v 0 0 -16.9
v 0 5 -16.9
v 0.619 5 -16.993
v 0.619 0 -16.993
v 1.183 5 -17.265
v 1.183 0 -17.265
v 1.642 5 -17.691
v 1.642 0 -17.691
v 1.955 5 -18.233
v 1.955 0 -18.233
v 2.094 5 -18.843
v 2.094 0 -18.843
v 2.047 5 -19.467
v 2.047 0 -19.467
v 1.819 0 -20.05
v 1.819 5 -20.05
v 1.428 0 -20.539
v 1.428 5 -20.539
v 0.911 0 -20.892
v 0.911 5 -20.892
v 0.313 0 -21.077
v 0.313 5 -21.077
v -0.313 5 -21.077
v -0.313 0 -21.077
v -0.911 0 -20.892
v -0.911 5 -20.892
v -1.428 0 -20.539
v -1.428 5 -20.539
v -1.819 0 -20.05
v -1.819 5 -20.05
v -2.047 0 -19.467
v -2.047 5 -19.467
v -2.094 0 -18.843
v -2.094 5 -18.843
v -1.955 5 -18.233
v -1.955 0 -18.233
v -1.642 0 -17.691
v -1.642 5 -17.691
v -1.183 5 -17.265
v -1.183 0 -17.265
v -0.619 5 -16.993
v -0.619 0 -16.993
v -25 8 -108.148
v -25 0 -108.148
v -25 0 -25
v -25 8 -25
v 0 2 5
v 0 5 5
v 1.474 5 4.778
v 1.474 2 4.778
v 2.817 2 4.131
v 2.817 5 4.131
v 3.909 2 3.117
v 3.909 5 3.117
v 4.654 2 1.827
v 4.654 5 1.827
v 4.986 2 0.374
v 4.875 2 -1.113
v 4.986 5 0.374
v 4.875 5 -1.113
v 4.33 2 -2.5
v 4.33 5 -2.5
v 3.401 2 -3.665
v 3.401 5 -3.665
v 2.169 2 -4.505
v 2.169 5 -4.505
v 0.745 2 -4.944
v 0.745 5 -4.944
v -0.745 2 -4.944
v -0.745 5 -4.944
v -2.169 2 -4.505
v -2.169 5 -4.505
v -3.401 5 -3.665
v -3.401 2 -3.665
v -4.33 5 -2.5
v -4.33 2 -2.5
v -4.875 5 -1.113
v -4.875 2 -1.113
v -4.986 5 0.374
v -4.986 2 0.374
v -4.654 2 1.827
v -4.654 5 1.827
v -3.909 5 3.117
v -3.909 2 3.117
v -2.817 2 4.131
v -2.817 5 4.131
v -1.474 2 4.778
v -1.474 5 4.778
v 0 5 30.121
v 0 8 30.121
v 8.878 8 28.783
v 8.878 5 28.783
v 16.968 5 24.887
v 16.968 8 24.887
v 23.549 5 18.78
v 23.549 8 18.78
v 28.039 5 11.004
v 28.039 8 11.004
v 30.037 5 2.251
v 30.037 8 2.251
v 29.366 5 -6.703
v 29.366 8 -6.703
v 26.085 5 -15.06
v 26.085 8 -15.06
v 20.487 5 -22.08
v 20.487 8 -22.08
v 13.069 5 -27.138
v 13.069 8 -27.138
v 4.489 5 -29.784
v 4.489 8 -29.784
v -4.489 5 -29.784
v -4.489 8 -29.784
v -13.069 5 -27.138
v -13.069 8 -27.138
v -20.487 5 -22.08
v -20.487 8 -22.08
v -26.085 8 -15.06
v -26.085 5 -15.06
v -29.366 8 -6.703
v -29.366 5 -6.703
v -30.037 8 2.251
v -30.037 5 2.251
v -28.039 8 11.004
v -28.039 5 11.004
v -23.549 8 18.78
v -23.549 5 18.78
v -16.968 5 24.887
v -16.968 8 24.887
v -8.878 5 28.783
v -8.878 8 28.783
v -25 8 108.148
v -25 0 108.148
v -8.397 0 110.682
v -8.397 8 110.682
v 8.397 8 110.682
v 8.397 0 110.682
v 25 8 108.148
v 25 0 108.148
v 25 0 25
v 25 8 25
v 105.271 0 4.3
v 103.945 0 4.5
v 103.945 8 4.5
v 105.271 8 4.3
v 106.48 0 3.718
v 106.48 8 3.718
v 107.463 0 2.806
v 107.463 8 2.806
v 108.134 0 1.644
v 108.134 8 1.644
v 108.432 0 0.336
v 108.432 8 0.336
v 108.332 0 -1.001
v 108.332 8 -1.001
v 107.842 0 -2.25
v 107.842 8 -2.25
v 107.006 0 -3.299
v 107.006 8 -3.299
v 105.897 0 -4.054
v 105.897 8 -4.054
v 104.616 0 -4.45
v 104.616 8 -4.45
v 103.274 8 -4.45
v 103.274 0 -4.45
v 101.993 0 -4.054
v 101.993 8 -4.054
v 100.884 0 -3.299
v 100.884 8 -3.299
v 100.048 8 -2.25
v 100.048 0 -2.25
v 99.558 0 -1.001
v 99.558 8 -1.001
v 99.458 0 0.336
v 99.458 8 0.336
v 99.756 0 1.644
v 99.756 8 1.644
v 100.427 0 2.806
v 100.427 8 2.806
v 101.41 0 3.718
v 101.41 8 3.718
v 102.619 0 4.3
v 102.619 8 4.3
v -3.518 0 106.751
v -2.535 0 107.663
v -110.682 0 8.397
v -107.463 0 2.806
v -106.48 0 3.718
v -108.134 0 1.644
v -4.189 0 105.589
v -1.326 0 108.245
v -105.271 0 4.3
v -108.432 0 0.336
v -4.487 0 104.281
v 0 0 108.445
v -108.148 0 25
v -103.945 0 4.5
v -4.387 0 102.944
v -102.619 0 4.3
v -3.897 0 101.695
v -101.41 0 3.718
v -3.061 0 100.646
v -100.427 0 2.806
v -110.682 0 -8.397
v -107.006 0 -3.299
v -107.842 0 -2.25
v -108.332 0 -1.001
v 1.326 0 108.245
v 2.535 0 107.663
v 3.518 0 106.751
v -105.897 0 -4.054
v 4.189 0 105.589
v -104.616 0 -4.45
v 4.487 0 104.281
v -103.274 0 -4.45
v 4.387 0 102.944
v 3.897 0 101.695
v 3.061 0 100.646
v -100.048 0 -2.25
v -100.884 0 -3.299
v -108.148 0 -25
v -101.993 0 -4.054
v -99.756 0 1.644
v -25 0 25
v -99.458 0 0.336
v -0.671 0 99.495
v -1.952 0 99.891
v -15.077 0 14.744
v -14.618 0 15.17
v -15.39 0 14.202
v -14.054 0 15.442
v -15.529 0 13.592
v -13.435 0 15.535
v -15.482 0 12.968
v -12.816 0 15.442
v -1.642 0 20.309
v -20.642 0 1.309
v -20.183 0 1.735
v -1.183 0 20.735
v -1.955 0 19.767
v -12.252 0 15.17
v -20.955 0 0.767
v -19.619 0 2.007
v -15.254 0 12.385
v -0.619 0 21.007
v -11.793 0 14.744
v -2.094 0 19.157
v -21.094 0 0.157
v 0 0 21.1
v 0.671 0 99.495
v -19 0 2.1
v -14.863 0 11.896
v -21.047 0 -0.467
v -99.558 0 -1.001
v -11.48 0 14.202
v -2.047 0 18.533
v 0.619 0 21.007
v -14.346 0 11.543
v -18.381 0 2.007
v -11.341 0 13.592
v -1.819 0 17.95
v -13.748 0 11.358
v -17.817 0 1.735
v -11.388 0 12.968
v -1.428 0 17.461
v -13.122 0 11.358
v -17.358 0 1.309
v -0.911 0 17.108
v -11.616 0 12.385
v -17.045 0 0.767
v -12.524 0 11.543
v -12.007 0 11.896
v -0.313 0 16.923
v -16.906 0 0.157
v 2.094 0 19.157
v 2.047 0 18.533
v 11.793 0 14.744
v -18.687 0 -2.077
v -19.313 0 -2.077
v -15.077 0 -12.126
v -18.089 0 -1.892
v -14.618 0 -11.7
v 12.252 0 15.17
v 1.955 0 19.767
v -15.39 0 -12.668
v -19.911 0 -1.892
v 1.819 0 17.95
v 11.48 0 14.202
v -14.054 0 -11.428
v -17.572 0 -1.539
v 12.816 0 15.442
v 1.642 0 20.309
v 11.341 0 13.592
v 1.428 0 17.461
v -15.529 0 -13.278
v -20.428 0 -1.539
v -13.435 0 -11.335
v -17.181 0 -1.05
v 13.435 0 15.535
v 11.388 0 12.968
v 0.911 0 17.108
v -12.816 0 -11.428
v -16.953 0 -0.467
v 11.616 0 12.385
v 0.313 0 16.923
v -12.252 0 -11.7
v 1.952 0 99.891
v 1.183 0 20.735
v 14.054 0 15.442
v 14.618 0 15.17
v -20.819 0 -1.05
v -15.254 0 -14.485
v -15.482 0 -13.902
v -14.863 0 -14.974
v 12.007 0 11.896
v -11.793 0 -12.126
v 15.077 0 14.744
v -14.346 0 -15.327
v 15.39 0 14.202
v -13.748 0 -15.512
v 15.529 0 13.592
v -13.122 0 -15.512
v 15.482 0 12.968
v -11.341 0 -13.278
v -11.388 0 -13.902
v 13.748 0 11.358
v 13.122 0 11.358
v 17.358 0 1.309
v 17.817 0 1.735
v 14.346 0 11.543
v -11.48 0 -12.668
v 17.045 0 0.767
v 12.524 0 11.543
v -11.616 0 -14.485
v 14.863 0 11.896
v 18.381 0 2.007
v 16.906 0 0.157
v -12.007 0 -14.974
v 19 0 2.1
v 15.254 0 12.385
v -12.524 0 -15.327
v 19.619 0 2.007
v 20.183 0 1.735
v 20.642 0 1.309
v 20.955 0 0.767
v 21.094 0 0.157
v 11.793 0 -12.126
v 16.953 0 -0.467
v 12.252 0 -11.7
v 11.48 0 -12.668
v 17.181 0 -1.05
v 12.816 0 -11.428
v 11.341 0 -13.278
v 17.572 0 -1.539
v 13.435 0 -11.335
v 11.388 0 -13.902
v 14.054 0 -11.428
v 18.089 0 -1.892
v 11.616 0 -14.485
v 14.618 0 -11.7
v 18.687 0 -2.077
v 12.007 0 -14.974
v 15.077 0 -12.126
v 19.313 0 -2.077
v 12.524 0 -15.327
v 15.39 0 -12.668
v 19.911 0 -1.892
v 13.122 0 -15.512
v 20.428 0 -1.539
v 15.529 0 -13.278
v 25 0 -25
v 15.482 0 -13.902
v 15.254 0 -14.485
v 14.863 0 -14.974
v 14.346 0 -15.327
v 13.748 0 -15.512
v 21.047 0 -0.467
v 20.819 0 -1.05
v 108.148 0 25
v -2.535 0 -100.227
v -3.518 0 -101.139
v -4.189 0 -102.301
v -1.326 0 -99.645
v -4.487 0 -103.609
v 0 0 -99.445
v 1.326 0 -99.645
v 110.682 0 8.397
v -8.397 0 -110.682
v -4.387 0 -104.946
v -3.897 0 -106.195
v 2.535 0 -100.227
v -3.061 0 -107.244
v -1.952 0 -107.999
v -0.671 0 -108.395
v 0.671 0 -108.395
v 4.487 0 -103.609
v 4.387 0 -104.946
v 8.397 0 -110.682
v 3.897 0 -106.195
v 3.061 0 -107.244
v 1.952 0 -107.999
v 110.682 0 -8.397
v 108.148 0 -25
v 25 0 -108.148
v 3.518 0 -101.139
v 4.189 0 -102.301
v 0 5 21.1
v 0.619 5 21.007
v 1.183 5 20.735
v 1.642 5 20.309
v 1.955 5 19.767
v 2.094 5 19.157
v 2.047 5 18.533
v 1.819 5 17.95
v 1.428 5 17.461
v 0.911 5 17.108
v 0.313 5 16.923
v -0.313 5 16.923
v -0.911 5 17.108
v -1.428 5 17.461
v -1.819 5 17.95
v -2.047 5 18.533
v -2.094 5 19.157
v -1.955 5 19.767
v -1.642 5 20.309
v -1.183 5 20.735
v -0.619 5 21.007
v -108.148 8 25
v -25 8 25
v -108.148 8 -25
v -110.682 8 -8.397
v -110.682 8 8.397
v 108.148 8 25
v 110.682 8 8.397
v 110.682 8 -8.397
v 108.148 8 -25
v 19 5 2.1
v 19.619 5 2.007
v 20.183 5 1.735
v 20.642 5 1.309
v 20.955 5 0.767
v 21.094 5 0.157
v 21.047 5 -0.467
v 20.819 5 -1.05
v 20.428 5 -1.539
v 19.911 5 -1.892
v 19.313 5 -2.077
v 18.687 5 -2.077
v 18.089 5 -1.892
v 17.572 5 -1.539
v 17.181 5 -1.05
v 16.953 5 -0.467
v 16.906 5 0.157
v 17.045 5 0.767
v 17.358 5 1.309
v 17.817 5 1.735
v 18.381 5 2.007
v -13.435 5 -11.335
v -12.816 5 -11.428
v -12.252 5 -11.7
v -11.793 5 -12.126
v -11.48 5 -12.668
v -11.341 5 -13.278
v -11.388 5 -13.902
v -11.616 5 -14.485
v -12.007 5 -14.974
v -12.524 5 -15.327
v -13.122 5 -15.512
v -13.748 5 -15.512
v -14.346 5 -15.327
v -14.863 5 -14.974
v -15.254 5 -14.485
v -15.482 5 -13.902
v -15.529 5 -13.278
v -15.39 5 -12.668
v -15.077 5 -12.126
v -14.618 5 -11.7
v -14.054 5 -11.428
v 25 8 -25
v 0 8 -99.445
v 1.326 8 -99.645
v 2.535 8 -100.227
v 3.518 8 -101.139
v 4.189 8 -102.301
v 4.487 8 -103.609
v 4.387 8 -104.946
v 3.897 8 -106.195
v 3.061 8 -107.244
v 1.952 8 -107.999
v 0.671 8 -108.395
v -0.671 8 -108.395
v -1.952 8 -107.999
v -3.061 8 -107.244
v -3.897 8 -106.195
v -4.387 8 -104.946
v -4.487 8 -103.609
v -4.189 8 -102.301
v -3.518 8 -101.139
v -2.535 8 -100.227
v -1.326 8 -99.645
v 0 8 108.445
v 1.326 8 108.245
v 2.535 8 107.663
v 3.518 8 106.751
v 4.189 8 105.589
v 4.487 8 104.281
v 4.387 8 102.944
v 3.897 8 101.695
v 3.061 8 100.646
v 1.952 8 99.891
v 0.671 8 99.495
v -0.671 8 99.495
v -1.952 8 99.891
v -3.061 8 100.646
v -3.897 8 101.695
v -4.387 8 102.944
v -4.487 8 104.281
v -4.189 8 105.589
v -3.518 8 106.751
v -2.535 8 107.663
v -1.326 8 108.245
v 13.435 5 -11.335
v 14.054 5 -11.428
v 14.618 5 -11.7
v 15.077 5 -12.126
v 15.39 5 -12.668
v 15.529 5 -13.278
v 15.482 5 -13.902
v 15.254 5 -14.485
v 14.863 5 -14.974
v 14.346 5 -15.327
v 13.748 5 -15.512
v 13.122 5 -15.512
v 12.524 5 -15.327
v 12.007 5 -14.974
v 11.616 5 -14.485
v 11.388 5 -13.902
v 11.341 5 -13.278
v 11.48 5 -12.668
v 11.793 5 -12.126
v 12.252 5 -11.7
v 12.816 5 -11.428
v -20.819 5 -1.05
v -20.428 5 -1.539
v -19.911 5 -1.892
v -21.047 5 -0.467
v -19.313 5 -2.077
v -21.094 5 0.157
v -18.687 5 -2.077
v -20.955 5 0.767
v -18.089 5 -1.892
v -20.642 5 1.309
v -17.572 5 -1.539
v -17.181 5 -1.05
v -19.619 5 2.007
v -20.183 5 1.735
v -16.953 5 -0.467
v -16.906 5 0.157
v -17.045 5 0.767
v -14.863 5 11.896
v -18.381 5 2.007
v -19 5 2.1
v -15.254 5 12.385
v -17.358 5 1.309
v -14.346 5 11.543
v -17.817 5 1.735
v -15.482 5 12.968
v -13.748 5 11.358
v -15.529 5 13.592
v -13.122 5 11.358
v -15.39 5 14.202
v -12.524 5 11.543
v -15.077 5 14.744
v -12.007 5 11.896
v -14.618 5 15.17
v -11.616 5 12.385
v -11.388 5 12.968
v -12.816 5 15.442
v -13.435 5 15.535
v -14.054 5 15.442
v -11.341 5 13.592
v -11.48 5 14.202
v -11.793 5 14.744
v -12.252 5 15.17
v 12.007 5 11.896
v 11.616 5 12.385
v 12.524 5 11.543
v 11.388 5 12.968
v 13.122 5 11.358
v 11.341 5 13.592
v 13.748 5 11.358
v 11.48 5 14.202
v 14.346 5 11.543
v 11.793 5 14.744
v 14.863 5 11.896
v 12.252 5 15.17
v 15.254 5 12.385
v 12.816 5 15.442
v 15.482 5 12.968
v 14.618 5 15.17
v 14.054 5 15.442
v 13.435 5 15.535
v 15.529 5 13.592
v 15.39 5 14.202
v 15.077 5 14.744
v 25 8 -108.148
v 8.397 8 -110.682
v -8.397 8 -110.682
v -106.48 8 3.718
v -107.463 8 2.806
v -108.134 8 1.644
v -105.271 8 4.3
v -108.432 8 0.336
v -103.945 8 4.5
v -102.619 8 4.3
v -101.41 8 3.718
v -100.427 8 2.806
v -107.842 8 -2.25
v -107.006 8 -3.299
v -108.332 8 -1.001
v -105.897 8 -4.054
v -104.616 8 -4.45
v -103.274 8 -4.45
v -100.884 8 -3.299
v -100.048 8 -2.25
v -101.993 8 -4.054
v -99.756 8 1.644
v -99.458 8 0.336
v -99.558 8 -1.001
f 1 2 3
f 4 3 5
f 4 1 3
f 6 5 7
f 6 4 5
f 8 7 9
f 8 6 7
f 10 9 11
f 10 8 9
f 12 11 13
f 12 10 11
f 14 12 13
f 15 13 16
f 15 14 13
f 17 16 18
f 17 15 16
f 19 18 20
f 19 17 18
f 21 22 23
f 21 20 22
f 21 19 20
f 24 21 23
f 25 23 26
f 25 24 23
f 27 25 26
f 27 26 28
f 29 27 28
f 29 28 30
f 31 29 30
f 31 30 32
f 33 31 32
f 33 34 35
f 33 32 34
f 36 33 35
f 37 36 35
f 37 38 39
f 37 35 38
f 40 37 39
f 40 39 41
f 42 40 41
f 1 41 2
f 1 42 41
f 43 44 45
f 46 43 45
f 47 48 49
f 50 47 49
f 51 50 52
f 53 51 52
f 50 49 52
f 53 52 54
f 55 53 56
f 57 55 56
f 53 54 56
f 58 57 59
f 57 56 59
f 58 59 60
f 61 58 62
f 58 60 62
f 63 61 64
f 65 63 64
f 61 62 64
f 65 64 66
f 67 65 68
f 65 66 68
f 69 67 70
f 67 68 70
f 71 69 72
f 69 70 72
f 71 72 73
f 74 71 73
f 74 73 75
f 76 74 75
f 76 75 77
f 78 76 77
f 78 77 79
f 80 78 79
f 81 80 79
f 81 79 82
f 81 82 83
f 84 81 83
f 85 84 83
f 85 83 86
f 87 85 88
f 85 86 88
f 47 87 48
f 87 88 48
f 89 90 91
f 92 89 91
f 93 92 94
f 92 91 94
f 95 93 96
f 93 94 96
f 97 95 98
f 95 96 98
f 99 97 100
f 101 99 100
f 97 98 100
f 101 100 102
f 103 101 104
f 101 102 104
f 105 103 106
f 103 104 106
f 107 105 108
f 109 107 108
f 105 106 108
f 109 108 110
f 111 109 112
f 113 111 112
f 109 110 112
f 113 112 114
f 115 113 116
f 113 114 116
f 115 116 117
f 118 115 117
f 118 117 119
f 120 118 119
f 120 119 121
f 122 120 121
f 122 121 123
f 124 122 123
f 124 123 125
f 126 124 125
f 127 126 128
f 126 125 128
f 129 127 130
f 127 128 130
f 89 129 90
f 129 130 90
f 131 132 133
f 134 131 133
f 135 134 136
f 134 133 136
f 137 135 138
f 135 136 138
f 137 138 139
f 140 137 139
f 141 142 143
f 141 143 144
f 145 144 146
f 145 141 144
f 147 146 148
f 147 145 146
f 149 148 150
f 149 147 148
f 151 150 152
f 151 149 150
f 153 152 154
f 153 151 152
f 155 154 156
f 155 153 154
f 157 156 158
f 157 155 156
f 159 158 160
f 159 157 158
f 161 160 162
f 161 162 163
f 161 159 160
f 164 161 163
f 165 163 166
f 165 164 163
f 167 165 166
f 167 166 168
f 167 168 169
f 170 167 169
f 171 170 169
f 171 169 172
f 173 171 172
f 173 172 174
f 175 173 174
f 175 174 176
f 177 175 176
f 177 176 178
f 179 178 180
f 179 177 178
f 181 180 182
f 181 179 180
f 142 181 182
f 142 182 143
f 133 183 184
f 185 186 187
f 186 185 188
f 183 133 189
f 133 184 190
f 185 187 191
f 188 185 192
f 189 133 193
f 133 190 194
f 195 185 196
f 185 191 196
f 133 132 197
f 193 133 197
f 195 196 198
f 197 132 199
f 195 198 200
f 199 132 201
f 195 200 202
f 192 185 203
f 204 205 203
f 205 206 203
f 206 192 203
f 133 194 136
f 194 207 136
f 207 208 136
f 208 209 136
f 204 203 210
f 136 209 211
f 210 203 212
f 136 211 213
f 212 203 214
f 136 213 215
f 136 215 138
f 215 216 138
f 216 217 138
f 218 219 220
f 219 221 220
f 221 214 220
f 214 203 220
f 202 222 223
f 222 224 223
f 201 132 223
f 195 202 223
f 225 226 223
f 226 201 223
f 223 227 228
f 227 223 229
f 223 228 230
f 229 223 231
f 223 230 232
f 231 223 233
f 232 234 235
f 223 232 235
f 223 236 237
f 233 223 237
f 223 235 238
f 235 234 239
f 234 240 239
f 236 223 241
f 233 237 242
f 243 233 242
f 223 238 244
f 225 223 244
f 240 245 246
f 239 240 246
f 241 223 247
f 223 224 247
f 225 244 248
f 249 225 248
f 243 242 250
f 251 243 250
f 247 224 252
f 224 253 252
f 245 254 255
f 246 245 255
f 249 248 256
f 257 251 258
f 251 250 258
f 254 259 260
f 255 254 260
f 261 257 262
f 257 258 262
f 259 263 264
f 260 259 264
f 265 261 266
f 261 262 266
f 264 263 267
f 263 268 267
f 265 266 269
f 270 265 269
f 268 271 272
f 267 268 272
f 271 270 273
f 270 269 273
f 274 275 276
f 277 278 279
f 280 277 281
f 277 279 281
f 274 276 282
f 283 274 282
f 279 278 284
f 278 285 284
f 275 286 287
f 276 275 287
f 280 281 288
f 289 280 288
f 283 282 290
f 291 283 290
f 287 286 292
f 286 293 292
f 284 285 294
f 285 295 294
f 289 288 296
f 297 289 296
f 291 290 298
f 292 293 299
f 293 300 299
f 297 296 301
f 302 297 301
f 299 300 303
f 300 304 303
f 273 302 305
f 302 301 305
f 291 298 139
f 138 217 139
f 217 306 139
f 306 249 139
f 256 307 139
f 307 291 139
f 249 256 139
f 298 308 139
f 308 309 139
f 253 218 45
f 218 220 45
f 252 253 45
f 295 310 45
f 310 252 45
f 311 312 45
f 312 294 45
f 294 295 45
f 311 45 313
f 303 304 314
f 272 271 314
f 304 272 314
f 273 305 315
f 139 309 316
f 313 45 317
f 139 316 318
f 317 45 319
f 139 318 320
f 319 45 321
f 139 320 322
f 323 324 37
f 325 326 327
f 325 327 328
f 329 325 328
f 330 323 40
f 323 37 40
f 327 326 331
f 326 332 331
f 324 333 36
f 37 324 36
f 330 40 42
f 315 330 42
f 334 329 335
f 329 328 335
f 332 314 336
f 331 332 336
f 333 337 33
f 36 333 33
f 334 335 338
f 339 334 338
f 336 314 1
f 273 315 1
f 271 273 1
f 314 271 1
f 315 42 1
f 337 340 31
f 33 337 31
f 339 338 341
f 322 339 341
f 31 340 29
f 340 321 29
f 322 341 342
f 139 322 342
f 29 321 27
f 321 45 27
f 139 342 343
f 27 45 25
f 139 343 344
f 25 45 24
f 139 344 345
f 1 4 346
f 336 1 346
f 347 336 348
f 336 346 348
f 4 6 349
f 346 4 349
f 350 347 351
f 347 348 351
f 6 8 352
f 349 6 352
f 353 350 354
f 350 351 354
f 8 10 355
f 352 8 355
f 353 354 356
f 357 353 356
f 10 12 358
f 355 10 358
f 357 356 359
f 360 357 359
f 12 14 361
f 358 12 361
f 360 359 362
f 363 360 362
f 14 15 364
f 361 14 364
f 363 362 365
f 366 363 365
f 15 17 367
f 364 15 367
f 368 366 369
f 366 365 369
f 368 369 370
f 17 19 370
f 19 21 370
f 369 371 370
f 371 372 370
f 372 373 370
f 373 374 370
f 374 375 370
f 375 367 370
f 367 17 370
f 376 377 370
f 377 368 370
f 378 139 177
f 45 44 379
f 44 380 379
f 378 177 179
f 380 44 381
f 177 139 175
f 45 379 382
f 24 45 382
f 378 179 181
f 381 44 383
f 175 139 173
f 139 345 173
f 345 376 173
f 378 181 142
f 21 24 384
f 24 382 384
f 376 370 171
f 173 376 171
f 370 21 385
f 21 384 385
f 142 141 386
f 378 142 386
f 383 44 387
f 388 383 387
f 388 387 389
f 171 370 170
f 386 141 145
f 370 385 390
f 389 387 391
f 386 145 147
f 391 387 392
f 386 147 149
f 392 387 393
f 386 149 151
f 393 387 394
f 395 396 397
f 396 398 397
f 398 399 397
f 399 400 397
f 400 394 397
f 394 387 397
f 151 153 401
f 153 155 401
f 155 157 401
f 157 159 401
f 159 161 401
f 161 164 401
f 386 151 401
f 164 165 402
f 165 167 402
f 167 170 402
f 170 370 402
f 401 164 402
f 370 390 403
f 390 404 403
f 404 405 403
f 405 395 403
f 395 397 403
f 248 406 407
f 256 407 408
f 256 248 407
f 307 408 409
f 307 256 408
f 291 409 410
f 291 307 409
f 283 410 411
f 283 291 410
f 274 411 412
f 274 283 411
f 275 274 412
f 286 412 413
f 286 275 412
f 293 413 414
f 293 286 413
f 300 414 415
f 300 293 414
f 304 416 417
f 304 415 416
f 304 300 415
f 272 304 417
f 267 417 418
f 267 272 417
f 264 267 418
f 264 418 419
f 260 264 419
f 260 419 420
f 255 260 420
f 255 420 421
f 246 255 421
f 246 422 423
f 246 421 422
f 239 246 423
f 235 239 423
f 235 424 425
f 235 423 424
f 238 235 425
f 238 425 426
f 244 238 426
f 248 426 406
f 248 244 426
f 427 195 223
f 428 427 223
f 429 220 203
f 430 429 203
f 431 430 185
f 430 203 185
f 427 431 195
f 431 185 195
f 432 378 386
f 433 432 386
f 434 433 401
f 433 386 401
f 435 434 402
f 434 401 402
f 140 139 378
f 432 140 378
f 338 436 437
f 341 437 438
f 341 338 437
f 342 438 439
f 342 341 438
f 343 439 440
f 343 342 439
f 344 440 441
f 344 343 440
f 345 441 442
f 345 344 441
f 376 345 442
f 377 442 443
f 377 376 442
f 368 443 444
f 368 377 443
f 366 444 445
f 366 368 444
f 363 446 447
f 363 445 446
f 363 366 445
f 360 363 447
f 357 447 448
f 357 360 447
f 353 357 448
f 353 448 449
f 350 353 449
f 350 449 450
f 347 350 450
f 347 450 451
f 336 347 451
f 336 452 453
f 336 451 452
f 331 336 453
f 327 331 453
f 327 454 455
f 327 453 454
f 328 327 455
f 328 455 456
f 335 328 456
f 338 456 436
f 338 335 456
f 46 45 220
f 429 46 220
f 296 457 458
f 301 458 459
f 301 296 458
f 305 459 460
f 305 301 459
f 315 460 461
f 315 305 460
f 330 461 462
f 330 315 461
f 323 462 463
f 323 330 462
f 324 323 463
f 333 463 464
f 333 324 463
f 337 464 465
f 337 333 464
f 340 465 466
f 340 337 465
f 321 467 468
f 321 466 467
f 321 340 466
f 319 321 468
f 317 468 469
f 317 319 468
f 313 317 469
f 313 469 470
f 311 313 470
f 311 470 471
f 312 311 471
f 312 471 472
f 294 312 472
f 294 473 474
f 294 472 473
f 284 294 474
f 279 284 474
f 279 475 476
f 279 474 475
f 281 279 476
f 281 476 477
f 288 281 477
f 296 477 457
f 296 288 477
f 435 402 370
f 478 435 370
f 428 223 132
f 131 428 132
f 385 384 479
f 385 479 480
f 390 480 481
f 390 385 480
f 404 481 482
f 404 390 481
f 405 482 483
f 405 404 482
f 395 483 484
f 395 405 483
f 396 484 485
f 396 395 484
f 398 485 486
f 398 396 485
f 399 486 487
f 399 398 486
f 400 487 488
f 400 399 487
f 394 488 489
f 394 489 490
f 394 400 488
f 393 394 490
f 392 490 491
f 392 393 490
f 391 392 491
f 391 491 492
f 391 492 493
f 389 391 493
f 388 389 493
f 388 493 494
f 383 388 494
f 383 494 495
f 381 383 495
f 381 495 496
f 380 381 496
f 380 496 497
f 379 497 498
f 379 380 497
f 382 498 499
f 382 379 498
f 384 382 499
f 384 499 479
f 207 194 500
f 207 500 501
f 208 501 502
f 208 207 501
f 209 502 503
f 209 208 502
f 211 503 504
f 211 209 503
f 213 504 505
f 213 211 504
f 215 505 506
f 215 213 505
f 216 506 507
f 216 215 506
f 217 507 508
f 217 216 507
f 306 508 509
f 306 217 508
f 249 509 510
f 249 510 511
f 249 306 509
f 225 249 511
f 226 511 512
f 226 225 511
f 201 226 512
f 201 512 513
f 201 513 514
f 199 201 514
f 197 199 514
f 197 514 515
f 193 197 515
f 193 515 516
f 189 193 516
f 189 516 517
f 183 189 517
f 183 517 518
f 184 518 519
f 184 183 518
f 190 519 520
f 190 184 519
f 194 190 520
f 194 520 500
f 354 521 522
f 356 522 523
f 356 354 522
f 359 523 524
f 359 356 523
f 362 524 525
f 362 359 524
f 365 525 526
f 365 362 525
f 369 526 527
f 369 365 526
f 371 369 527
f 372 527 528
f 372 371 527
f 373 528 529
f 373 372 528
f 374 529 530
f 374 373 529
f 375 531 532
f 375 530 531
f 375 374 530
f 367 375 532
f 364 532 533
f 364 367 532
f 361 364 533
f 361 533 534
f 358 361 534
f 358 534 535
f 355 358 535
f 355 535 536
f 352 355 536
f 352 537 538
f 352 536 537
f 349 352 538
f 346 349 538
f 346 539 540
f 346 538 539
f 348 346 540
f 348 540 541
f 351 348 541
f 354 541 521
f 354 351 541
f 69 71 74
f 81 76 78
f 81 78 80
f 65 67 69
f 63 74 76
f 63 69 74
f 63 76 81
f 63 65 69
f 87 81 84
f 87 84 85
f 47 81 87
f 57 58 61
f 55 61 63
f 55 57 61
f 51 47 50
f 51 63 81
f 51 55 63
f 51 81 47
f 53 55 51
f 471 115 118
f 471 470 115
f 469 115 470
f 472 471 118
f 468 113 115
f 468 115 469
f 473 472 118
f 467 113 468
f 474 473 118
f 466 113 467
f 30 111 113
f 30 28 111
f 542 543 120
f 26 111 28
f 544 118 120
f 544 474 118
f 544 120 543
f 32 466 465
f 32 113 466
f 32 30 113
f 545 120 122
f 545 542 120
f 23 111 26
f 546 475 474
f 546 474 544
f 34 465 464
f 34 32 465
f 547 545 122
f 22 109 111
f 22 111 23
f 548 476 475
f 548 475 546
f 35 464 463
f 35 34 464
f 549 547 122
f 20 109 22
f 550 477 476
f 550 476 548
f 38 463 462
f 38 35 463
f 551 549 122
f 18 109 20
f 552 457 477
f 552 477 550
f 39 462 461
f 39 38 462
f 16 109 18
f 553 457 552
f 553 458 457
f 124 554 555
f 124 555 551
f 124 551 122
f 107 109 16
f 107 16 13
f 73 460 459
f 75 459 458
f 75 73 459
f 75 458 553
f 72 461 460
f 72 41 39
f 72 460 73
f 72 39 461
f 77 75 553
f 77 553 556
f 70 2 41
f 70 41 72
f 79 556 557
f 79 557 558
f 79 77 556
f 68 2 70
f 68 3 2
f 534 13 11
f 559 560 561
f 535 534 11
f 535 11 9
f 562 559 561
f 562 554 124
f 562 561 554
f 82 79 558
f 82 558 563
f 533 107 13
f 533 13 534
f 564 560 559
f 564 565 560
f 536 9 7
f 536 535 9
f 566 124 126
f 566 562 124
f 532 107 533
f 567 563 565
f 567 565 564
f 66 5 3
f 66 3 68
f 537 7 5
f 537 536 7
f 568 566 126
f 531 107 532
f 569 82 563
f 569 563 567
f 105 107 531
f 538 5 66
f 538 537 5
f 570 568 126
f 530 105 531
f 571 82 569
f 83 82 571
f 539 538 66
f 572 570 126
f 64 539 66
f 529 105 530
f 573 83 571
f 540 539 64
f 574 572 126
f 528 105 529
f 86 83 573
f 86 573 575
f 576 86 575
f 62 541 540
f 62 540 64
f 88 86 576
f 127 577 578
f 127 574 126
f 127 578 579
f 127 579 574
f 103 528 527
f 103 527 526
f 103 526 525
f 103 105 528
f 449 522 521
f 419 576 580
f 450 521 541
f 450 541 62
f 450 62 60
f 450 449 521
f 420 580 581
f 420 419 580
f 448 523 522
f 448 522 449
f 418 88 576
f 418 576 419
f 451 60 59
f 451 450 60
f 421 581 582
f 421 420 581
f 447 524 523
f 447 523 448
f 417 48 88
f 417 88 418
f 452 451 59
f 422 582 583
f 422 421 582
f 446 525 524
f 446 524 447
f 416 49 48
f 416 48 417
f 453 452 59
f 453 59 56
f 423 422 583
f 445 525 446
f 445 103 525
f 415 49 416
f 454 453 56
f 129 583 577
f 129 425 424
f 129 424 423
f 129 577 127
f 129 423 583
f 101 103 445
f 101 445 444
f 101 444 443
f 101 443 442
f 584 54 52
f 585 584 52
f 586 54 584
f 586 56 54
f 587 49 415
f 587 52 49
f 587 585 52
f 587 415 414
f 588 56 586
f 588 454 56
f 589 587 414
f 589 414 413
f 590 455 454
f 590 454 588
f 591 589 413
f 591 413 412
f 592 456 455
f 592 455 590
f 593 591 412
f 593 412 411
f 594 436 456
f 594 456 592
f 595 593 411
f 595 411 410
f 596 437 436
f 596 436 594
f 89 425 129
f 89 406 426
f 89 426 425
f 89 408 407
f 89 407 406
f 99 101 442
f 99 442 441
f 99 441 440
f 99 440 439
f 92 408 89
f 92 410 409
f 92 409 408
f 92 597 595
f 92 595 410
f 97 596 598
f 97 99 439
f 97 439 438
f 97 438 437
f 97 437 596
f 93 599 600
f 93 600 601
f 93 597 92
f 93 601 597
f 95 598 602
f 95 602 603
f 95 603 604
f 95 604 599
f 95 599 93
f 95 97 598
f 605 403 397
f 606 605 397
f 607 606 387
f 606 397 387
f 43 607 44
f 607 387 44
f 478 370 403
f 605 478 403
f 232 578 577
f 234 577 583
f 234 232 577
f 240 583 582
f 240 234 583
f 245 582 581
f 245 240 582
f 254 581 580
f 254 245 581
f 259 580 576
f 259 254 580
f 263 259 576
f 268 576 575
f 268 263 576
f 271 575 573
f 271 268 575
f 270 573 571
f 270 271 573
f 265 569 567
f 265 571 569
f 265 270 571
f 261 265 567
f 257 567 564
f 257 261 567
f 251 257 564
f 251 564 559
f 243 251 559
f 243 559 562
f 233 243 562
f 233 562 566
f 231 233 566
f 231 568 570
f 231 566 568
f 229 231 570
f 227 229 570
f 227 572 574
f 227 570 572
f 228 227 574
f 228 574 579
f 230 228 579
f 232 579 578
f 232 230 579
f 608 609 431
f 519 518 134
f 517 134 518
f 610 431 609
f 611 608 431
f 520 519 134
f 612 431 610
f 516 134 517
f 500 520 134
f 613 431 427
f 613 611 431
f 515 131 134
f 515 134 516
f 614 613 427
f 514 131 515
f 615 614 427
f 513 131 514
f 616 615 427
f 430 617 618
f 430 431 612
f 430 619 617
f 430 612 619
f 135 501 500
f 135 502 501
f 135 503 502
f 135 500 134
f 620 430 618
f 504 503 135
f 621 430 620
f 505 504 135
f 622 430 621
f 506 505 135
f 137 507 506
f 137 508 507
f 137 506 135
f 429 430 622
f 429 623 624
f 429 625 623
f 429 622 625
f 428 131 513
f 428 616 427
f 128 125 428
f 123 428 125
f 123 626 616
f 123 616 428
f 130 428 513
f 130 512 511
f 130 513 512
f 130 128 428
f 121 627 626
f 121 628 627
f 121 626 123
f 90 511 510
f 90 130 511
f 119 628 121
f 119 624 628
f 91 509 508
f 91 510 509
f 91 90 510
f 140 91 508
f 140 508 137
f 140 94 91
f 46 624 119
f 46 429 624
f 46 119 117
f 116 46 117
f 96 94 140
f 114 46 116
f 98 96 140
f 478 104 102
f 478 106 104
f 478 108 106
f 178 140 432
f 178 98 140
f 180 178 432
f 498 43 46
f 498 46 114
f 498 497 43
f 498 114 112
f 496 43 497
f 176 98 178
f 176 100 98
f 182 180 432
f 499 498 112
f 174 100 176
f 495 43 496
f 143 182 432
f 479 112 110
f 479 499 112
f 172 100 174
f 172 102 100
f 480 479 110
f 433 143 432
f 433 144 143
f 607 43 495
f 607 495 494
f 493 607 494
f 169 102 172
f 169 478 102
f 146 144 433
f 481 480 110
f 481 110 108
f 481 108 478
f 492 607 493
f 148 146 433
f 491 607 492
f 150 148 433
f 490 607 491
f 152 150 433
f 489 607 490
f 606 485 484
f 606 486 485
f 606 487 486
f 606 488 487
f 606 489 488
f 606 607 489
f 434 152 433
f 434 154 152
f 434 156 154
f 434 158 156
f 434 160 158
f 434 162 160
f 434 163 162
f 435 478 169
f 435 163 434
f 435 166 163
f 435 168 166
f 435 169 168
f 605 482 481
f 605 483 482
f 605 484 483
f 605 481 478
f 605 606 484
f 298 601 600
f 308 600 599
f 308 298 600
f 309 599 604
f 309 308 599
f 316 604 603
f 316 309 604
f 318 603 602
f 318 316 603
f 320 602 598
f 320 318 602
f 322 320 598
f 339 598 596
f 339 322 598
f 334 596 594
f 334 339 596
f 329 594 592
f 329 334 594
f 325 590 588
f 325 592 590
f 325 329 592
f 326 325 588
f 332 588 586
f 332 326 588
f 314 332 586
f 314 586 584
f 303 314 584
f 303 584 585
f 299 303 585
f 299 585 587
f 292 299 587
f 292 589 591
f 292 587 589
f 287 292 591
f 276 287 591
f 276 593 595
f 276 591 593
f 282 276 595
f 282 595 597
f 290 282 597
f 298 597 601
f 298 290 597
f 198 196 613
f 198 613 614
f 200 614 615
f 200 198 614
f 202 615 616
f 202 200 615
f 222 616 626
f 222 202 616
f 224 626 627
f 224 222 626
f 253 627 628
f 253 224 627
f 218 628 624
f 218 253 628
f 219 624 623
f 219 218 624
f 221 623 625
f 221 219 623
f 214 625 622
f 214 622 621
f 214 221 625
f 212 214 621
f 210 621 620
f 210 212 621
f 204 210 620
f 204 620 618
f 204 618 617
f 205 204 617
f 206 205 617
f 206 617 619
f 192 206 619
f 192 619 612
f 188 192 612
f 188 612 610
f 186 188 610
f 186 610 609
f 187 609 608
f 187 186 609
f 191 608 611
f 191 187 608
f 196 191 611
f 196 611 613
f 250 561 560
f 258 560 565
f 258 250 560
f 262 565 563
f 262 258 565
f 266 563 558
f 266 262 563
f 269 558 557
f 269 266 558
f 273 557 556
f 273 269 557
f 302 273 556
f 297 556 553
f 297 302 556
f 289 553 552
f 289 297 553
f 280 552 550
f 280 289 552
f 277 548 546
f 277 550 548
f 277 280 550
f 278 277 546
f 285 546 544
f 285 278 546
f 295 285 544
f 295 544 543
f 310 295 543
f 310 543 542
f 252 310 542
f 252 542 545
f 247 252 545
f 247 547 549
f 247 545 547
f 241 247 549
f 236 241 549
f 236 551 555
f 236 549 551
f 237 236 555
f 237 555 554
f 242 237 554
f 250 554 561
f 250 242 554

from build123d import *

# Parameters (mm, degrees)
SKETCH_1_R          = 2.1
SKETCH_1_R_2        = 4.5
EXTRUDE_1_DEPTH     = 8
SKETCH_2_R          = 30.120830341
CUT_EXTRUDE_1_DEPTH = 3
SKETCH_3_R          = 5
CUT_EXTRUDE_2_DEPTH = 3


with BuildPart() as part:
    # 草图1 → 凸台-拉伸1 (new body)
    with BuildSketch(Plane(origin=(0, 0, 0), x_dir=(1, 0, 0), z_dir=(0, 1, 0))):
        with BuildLine():
            Line((-25, 108.148046677), (-25, 25))
            Line((-25, 25), (-108.148046677, 25))
            ThreePointArc((-108.148046677, 25), (-111, 0), (-108.148046677, -25))
            Line((-108.148046677, -25), (-25, -25))
            Line((-25, -25), (-25, -108.148046677))
            ThreePointArc((-25, -108.148046677), (0, -111), (25, -108.148046677))
            Line((25, -108.148046677), (25, -25))
            Line((25, -25), (108.148046677, -25))
            ThreePointArc((108.148046677, -25), (111, 0), (108.148046677, 25))
            Line((108.148046677, 25), (25, 25))
            Line((25, 25), (25, 108.148046677))
            ThreePointArc((25, 108.148046677), (0, 111), (-25, 108.148046677))
        make_face()
        with Locations(Location((0, 19, 0), (0, 0, 270))):
            Circle(SKETCH_1_R, mode=Mode.SUBTRACT)
        with Locations(Location((13.435028843, 13.435028843, 0), (0, 0, 270))):
            Circle(SKETCH_1_R, mode=Mode.SUBTRACT)
        with Locations(Location((19, 0, 0), (0, 0, 270))):
            Circle(SKETCH_1_R, mode=Mode.SUBTRACT)
        with Locations(Location((13.435028843, -13.435028843, 0), (0, 0, 270))):
            Circle(SKETCH_1_R, mode=Mode.SUBTRACT)
        with Locations(Location((0, -19, 0), (0, 0, 270))):
            Circle(SKETCH_1_R, mode=Mode.SUBTRACT)
        with Locations(Location((-13.435028843, -13.435028843, 0), (0, 0, 270))):
            Circle(SKETCH_1_R, mode=Mode.SUBTRACT)
        with Locations(Location((-19, 0, 0), (0, 0, 270))):
            Circle(SKETCH_1_R, mode=Mode.SUBTRACT)
        with Locations(Location((-13.435028843, 13.435028843, 0), (0, 0, 270))):
            Circle(SKETCH_1_R, mode=Mode.SUBTRACT)
        with Locations(Location((0, 103.945, 0), (0, 0, 270))):
            Circle(SKETCH_1_R_2, mode=Mode.SUBTRACT)
        with Locations(Location((103.945, 0, 0), (0, 0, 270))):
            Circle(SKETCH_1_R_2, mode=Mode.SUBTRACT)
        with Locations(Location((0, -103.945, 0), (0, 0, 270))):
            Circle(SKETCH_1_R_2, mode=Mode.SUBTRACT)
        with Locations(Location((-103.945, 0, 0), (0, 0, 270))):
            Circle(SKETCH_1_R_2, mode=Mode.SUBTRACT)
    extrude(amount=EXTRUDE_1_DEPTH)

    # 草图2 → 切除-拉伸1 (cut)
    with BuildSketch(Plane(origin=(0, 8, 0), x_dir=(1, 0, 0), z_dir=(0, 1, 0))):
        with Locations(Location((0, 0, 0), (0, 0, 270))):
            Circle(SKETCH_2_R)
    extrude(amount=-CUT_EXTRUDE_1_DEPTH, mode=Mode.SUBTRACT)

    # 草图3 → 切除-拉伸2 (cut)
    with BuildSketch(Plane(origin=(0, 5, 0), x_dir=(1, 0, 0), z_dir=(0, 1, 0))):
        with Locations(Location((0, 0, 0), (0, 0, 270))):
            Circle(SKETCH_3_R)
    extrude(amount=-CUT_EXTRUDE_2_DEPTH, mode=Mode.SUBTRACT)


solid = part.part
